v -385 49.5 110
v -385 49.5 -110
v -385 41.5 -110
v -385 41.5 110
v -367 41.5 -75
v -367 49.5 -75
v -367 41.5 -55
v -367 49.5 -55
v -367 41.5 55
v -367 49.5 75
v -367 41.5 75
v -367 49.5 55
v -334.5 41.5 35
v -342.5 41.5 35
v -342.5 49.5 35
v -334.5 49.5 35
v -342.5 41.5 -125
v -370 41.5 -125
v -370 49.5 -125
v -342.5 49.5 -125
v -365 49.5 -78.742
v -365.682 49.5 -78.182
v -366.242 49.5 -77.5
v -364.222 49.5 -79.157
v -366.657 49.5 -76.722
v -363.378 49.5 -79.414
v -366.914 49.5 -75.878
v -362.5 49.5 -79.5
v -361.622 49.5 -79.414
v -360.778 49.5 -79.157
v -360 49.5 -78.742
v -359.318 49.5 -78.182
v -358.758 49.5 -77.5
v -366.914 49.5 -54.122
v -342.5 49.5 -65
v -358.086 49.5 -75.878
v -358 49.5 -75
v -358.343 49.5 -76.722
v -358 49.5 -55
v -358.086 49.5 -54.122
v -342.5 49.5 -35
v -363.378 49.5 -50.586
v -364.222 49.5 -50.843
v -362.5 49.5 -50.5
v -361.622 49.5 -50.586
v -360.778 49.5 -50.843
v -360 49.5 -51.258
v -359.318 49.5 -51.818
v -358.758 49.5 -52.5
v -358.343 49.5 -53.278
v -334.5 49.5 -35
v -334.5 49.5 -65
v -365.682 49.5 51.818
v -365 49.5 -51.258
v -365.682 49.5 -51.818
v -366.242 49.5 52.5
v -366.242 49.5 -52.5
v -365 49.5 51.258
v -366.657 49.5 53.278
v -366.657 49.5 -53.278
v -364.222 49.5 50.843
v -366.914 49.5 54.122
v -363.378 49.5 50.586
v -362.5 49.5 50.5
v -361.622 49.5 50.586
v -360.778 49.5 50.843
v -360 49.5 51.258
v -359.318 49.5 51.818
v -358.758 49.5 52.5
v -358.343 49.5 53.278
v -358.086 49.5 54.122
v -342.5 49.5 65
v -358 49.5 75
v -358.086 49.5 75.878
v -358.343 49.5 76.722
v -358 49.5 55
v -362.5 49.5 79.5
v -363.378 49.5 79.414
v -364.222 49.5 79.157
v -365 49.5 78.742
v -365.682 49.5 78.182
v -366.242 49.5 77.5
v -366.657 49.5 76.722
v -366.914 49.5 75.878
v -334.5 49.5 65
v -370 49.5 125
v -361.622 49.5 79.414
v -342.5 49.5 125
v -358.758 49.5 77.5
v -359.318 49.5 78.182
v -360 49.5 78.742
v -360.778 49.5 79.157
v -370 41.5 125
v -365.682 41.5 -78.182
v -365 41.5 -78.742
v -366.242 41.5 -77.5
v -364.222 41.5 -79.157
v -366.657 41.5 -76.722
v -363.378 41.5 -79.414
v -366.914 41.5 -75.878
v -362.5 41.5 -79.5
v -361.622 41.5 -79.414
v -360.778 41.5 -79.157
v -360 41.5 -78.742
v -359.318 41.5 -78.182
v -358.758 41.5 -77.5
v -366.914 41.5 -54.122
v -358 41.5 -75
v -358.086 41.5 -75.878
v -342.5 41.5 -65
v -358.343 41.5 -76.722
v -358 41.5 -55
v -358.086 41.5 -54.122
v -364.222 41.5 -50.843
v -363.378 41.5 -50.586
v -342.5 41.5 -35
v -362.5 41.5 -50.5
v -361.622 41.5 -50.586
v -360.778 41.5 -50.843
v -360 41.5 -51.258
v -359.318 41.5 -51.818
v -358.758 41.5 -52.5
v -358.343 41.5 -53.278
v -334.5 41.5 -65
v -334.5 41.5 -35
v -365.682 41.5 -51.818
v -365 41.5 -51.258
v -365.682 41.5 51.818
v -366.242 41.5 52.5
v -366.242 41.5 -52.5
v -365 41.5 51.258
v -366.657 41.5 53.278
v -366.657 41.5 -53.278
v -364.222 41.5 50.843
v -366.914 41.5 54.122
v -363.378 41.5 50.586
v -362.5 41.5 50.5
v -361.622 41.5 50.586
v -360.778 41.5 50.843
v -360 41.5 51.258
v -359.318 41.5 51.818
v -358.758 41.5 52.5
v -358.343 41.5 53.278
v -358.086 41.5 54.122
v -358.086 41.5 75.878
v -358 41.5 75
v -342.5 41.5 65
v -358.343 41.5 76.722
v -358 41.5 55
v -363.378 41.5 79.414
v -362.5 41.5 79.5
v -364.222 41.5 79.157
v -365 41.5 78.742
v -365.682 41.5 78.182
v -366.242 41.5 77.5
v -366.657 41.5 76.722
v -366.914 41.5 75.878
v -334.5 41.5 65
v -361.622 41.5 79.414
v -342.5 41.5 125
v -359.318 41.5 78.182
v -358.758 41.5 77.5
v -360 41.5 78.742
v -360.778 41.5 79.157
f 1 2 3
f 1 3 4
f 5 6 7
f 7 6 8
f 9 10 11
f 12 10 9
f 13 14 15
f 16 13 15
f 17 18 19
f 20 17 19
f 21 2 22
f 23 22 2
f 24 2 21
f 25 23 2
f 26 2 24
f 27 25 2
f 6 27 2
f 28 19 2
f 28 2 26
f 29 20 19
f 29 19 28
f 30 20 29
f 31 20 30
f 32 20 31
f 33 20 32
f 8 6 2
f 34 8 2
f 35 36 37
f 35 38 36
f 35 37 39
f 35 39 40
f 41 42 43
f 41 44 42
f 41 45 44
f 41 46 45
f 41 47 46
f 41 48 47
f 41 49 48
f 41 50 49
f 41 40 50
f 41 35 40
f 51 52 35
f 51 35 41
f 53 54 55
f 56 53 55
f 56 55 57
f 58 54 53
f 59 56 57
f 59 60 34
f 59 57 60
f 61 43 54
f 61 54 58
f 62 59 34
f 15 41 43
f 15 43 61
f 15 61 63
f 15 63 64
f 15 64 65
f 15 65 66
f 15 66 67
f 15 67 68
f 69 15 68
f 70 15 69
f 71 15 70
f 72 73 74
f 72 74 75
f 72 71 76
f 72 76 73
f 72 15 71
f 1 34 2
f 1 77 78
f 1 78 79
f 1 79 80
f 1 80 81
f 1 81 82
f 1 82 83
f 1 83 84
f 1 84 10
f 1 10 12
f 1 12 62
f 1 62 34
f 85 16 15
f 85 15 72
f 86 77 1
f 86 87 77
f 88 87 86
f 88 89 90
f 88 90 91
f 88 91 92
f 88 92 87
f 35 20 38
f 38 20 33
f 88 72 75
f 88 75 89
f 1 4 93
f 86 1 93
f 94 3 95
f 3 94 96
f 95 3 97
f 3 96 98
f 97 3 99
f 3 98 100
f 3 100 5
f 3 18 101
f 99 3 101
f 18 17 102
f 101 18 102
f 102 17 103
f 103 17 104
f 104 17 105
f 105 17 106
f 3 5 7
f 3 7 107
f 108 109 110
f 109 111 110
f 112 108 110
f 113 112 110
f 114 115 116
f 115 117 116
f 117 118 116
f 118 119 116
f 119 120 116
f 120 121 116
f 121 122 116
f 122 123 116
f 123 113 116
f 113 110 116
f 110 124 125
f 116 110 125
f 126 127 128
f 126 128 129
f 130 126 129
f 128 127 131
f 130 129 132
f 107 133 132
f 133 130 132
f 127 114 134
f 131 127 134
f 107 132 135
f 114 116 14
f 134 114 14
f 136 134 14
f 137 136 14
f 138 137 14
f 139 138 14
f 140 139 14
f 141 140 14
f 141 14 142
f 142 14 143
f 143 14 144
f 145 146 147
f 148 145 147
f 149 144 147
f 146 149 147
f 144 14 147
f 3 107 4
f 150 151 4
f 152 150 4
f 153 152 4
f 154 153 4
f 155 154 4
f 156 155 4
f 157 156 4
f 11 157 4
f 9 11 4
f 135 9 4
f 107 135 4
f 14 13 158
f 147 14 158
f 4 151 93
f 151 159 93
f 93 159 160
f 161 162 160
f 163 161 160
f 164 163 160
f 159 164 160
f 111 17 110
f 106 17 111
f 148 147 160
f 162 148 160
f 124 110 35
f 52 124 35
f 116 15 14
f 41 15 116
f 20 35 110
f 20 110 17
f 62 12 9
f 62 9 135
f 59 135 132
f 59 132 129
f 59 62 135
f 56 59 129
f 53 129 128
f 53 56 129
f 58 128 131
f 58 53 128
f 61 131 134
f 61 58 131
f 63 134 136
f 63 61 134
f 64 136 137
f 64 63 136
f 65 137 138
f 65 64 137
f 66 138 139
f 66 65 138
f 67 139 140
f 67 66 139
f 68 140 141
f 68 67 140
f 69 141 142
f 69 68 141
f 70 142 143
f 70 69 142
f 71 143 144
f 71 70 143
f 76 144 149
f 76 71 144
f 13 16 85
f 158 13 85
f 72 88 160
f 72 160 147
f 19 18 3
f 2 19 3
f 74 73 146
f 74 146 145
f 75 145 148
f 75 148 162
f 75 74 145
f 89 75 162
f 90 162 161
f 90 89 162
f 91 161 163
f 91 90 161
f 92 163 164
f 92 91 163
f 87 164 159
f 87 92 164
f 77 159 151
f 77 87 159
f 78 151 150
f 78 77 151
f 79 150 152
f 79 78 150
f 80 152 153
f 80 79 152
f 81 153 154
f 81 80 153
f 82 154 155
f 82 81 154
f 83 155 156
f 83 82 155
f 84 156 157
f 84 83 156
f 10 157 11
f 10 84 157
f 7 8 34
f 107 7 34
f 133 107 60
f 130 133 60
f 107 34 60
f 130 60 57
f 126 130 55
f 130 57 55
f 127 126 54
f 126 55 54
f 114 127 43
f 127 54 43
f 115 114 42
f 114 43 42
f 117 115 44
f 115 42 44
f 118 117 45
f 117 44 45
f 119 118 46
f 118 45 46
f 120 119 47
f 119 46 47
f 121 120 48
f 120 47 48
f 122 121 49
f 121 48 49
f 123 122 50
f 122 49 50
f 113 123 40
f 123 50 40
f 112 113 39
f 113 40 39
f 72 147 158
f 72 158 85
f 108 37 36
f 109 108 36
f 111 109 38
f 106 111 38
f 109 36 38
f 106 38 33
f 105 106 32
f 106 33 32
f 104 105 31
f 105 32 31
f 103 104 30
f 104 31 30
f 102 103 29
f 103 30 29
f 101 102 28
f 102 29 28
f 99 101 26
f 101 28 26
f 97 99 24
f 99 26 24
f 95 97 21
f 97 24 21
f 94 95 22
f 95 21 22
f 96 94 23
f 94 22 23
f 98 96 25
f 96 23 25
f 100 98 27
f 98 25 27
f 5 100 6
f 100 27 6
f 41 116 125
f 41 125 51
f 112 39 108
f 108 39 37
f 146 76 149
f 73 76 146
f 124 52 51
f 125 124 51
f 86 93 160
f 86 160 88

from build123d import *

# Parameters (mm, degrees)
SKETCH1_W           = 685
SKETCH1_H           = 250
BASE_FLANGE1_DEPTH  = 8
SKETCH6_W           = 60
SKETCH6_H           = 8
SKETCH6_W_2         = 70
EXTRUDE1_DEPTH      = 8
SKETCH7_W           = 250
SKETCH7_H           = 73.5
BASE_FLANGE2_DEPTH  = 8
SKETCH12_W          = 30.5
SKETCH12_H          = 8.5
EXTRUDE2_DEPTH      = 699.681794525
SKETCH14_W          = 250
SKETCH14_H          = 8
BASE_FLANGE3_DEPTH  = 50.5
SKETCH19_W          = 60
SKETCH19_H          = 8
SKETCH19_W_2        = 70
EXTRUDE3_DEPTH      = 8
BREAK_CORNER1_START = 41.5
BREAK_CORNER1_DEPTH = 8
EXTRUDE4_DEPTH      = 8
BASE_FLANGE4_DEPTH  = 8
SKETCH38_W          = 8.5
SKETCH38_H          = 20.5
EXTRUDE5_DEPTH      = 10
SKETCH39_W          = 20.5
SKETCH39_H          = 8.5
EXTRUDE6_DEPTH      = 10


# Read off the part's stored shape, not the designer's step: Break-Corner1
# Sheet-metal steps are written as plain solids
with BuildPart() as part:
    # Sketch1 → Base-Flange1 (new body)
    with BuildSketch(Plane(origin=(0, 0, 0), x_dir=(1, 0, 0), z_dir=(0, 1, 0))):
        Rectangle(SKETCH1_W, SKETCH1_H)
    extrude(amount=-BASE_FLANGE1_DEPTH)

    # Sketch6 → Extrude1 (cut)
    with BuildSketch(Plane(origin=(342.5, 0, 0), x_dir=(0, 0, -1), z_dir=(1, 0, 0))):
        with Locations((-95, -4)):
            Rectangle(SKETCH6_W, SKETCH6_H)
        with Locations((95, -4)):
            Rectangle(SKETCH6_W, SKETCH6_H)
        with Locations((0, -4)):
            Rectangle(SKETCH6_W_2, SKETCH6_H)
    extrude1 = extrude(amount=-EXTRUDE1_DEPTH, mode=Mode.SUBTRACT)

    # Mirror1: Extrude1 across plane
    add(extrude1.mirror(Plane(origin=(0, 0, 0), x_dir=(0, 0, 1), z_dir=(1, 0, 0))), mode=Mode.SUBTRACT)

    # Sketch39 → Extrude6 (cut)
    with BuildSketch(Plane.XZ.offset(8)):
        with Locations((289.5, 0)):
            Rectangle(SKETCH39_W, SKETCH39_H)
        with Locations((229.5, 0)):
            Rectangle(SKETCH39_W, SKETCH39_H)
        with Locations((-289.5, 0)):
            Rectangle(SKETCH39_W, SKETCH39_H)
        with Locations((-229.5, 0)):
            Rectangle(SKETCH39_W, SKETCH39_H)
    extrude(amount=-EXTRUDE6_DEPTH, mode=Mode.SUBTRACT)


with BuildPart() as body_2:
    # Sketch7 → Base-Flange2 (new body)
    with BuildSketch(Plane(origin=(334.5, 0, 0), x_dir=(0, 0, -1), z_dir=(1, 0, 0))):
        with Locations((0, 20.75)):
            Rectangle(SKETCH7_W, SKETCH7_H)
    extrude(amount=BASE_FLANGE2_DEPTH)

    # Sketch12 → Extrude2 (cut, through all)
    with BuildSketch(Plane(origin=(342.5, 0, 0), x_dir=(0, 0, -1), z_dir=(1, 0, 0))):
        with Locations((-50, -4)):
            Rectangle(SKETCH12_W, SKETCH12_H)
        with Locations((50, -4)):
            Rectangle(SKETCH12_W, SKETCH12_H)
        with Locations((50, 45.5)):
            Rectangle(SKETCH12_W, SKETCH12_H)
        with Locations((-50, 45.5)):
            Rectangle(SKETCH12_W, SKETCH12_H)
    extrude(amount=-EXTRUDE2_DEPTH, mode=Mode.SUBTRACT)

    # Sketch38 → Extrude5 (cut)
    with BuildSketch(Plane(origin=(342.5, 0, 0), x_dir=(0, 0, -1), z_dir=(1, 0, 0))):
        with Locations((0, 27.5)):
            Rectangle(SKETCH38_W, SKETCH38_H)
    extrude(amount=-EXTRUDE5_DEPTH, mode=Mode.SUBTRACT)


with BuildPart() as body_3:
    # Sketch14 → Base-Flange3 (new body)
    with BuildSketch(Plane.ZY.offset(-334.5)):
        with Locations((0, 45.5)):
            Rectangle(SKETCH14_W, SKETCH14_H)
    extrude(amount=-BASE_FLANGE3_DEPTH)

    # Sketch19 → Extrude3 (cut)
    with BuildSketch(Plane(origin=(342.5, 0, 0), x_dir=(0, 0, -1), z_dir=(1, 0, 0))):
        with Locations((95, 45.5)):
            Rectangle(SKETCH19_W, SKETCH19_H)
        with Locations((0, 45.5)):
            Rectangle(SKETCH19_W_2, SKETCH19_H)
        with Locations((-95, 45.5)):
            Rectangle(SKETCH19_W, SKETCH19_H)
    extrude(amount=-EXTRUDE3_DEPTH, mode=Mode.SUBTRACT)

    # Break-Corner1 outline → Break-Corner1 (cut)
    with BuildSketch(Plane(origin=(0, 0, 0), x_dir=(1, 0, 0), z_dir=(0, 1, 0)).offset(BREAK_CORNER1_START)):
        Polygon((385, -125), (385, -110), (370, -125), align=None)
        Polygon((370, 125), (385, 110), (385, 125), align=None)
    extrude(amount=BREAK_CORNER1_DEPTH, mode=Mode.SUBTRACT)

    # Sketch20 → Extrude4 (cut)
    with BuildSketch(Plane(origin=(0, 49.5, 0), x_dir=(1, 0, 0), z_dir=(0, 1, 0))):
        with BuildLine():
            Line((367, 75), (367, 55))
            ThreePointArc((367, 55), (362.5, 50.5), (358, 55))
            Line((358, 55), (358, 75))
            ThreePointArc((358, 75), (362.5, 79.5), (367, 75))
        make_face()
        with BuildLine():
            Line((367, -75), (367, -55))
            ThreePointArc((367, -55), (362.5, -50.5), (358, -55))
            Line((358, -55), (358, -75))
            ThreePointArc((358, -75), (362.5, -79.5), (367, -75))
        make_face()
    extrude(amount=-EXTRUDE4_DEPTH, mode=Mode.SUBTRACT)


with BuildPart() as body_4:
    # Mirror4: mirrored copy
    add(body_3.part.mirror(Plane(origin=(0, 0, 0), x_dir=(0, 0, 1), z_dir=(1, 0, 0))))


with BuildPart() as body_5:
    # Sketch29 → Base-Flange4 (new body)
    with BuildSketch(Plane.XY.offset(4)):
        Polygon((219.5, 0), (219.5, -8), (239.5, -8), (239.5, 0), (279.5, 0), (279.5, -8), (299.5, -8), (299.5, 0), (334.5, 0), (334.5, 17.5), (342.5, 17.5), (342.5, 37.5), (334.5, 37.5), (334.5, 57.5), (194.5, 10), (194.5, 0), align=None)
    extrude(amount=-BASE_FLANGE4_DEPTH)


with BuildPart() as body_6:
    # Mirror5: mirrored copy
    add(body_5.part.mirror(Plane(origin=(0, 0, 0), x_dir=(0, 0, 1), z_dir=(1, 0, 0))))


with BuildPart() as body_7:
    # Mirror3: mirrored copy
    add(body_2.part.mirror(Plane(origin=(0, 0, 0), x_dir=(0, 0, 1), z_dir=(1, 0, 0))))


solid = body_4.part
